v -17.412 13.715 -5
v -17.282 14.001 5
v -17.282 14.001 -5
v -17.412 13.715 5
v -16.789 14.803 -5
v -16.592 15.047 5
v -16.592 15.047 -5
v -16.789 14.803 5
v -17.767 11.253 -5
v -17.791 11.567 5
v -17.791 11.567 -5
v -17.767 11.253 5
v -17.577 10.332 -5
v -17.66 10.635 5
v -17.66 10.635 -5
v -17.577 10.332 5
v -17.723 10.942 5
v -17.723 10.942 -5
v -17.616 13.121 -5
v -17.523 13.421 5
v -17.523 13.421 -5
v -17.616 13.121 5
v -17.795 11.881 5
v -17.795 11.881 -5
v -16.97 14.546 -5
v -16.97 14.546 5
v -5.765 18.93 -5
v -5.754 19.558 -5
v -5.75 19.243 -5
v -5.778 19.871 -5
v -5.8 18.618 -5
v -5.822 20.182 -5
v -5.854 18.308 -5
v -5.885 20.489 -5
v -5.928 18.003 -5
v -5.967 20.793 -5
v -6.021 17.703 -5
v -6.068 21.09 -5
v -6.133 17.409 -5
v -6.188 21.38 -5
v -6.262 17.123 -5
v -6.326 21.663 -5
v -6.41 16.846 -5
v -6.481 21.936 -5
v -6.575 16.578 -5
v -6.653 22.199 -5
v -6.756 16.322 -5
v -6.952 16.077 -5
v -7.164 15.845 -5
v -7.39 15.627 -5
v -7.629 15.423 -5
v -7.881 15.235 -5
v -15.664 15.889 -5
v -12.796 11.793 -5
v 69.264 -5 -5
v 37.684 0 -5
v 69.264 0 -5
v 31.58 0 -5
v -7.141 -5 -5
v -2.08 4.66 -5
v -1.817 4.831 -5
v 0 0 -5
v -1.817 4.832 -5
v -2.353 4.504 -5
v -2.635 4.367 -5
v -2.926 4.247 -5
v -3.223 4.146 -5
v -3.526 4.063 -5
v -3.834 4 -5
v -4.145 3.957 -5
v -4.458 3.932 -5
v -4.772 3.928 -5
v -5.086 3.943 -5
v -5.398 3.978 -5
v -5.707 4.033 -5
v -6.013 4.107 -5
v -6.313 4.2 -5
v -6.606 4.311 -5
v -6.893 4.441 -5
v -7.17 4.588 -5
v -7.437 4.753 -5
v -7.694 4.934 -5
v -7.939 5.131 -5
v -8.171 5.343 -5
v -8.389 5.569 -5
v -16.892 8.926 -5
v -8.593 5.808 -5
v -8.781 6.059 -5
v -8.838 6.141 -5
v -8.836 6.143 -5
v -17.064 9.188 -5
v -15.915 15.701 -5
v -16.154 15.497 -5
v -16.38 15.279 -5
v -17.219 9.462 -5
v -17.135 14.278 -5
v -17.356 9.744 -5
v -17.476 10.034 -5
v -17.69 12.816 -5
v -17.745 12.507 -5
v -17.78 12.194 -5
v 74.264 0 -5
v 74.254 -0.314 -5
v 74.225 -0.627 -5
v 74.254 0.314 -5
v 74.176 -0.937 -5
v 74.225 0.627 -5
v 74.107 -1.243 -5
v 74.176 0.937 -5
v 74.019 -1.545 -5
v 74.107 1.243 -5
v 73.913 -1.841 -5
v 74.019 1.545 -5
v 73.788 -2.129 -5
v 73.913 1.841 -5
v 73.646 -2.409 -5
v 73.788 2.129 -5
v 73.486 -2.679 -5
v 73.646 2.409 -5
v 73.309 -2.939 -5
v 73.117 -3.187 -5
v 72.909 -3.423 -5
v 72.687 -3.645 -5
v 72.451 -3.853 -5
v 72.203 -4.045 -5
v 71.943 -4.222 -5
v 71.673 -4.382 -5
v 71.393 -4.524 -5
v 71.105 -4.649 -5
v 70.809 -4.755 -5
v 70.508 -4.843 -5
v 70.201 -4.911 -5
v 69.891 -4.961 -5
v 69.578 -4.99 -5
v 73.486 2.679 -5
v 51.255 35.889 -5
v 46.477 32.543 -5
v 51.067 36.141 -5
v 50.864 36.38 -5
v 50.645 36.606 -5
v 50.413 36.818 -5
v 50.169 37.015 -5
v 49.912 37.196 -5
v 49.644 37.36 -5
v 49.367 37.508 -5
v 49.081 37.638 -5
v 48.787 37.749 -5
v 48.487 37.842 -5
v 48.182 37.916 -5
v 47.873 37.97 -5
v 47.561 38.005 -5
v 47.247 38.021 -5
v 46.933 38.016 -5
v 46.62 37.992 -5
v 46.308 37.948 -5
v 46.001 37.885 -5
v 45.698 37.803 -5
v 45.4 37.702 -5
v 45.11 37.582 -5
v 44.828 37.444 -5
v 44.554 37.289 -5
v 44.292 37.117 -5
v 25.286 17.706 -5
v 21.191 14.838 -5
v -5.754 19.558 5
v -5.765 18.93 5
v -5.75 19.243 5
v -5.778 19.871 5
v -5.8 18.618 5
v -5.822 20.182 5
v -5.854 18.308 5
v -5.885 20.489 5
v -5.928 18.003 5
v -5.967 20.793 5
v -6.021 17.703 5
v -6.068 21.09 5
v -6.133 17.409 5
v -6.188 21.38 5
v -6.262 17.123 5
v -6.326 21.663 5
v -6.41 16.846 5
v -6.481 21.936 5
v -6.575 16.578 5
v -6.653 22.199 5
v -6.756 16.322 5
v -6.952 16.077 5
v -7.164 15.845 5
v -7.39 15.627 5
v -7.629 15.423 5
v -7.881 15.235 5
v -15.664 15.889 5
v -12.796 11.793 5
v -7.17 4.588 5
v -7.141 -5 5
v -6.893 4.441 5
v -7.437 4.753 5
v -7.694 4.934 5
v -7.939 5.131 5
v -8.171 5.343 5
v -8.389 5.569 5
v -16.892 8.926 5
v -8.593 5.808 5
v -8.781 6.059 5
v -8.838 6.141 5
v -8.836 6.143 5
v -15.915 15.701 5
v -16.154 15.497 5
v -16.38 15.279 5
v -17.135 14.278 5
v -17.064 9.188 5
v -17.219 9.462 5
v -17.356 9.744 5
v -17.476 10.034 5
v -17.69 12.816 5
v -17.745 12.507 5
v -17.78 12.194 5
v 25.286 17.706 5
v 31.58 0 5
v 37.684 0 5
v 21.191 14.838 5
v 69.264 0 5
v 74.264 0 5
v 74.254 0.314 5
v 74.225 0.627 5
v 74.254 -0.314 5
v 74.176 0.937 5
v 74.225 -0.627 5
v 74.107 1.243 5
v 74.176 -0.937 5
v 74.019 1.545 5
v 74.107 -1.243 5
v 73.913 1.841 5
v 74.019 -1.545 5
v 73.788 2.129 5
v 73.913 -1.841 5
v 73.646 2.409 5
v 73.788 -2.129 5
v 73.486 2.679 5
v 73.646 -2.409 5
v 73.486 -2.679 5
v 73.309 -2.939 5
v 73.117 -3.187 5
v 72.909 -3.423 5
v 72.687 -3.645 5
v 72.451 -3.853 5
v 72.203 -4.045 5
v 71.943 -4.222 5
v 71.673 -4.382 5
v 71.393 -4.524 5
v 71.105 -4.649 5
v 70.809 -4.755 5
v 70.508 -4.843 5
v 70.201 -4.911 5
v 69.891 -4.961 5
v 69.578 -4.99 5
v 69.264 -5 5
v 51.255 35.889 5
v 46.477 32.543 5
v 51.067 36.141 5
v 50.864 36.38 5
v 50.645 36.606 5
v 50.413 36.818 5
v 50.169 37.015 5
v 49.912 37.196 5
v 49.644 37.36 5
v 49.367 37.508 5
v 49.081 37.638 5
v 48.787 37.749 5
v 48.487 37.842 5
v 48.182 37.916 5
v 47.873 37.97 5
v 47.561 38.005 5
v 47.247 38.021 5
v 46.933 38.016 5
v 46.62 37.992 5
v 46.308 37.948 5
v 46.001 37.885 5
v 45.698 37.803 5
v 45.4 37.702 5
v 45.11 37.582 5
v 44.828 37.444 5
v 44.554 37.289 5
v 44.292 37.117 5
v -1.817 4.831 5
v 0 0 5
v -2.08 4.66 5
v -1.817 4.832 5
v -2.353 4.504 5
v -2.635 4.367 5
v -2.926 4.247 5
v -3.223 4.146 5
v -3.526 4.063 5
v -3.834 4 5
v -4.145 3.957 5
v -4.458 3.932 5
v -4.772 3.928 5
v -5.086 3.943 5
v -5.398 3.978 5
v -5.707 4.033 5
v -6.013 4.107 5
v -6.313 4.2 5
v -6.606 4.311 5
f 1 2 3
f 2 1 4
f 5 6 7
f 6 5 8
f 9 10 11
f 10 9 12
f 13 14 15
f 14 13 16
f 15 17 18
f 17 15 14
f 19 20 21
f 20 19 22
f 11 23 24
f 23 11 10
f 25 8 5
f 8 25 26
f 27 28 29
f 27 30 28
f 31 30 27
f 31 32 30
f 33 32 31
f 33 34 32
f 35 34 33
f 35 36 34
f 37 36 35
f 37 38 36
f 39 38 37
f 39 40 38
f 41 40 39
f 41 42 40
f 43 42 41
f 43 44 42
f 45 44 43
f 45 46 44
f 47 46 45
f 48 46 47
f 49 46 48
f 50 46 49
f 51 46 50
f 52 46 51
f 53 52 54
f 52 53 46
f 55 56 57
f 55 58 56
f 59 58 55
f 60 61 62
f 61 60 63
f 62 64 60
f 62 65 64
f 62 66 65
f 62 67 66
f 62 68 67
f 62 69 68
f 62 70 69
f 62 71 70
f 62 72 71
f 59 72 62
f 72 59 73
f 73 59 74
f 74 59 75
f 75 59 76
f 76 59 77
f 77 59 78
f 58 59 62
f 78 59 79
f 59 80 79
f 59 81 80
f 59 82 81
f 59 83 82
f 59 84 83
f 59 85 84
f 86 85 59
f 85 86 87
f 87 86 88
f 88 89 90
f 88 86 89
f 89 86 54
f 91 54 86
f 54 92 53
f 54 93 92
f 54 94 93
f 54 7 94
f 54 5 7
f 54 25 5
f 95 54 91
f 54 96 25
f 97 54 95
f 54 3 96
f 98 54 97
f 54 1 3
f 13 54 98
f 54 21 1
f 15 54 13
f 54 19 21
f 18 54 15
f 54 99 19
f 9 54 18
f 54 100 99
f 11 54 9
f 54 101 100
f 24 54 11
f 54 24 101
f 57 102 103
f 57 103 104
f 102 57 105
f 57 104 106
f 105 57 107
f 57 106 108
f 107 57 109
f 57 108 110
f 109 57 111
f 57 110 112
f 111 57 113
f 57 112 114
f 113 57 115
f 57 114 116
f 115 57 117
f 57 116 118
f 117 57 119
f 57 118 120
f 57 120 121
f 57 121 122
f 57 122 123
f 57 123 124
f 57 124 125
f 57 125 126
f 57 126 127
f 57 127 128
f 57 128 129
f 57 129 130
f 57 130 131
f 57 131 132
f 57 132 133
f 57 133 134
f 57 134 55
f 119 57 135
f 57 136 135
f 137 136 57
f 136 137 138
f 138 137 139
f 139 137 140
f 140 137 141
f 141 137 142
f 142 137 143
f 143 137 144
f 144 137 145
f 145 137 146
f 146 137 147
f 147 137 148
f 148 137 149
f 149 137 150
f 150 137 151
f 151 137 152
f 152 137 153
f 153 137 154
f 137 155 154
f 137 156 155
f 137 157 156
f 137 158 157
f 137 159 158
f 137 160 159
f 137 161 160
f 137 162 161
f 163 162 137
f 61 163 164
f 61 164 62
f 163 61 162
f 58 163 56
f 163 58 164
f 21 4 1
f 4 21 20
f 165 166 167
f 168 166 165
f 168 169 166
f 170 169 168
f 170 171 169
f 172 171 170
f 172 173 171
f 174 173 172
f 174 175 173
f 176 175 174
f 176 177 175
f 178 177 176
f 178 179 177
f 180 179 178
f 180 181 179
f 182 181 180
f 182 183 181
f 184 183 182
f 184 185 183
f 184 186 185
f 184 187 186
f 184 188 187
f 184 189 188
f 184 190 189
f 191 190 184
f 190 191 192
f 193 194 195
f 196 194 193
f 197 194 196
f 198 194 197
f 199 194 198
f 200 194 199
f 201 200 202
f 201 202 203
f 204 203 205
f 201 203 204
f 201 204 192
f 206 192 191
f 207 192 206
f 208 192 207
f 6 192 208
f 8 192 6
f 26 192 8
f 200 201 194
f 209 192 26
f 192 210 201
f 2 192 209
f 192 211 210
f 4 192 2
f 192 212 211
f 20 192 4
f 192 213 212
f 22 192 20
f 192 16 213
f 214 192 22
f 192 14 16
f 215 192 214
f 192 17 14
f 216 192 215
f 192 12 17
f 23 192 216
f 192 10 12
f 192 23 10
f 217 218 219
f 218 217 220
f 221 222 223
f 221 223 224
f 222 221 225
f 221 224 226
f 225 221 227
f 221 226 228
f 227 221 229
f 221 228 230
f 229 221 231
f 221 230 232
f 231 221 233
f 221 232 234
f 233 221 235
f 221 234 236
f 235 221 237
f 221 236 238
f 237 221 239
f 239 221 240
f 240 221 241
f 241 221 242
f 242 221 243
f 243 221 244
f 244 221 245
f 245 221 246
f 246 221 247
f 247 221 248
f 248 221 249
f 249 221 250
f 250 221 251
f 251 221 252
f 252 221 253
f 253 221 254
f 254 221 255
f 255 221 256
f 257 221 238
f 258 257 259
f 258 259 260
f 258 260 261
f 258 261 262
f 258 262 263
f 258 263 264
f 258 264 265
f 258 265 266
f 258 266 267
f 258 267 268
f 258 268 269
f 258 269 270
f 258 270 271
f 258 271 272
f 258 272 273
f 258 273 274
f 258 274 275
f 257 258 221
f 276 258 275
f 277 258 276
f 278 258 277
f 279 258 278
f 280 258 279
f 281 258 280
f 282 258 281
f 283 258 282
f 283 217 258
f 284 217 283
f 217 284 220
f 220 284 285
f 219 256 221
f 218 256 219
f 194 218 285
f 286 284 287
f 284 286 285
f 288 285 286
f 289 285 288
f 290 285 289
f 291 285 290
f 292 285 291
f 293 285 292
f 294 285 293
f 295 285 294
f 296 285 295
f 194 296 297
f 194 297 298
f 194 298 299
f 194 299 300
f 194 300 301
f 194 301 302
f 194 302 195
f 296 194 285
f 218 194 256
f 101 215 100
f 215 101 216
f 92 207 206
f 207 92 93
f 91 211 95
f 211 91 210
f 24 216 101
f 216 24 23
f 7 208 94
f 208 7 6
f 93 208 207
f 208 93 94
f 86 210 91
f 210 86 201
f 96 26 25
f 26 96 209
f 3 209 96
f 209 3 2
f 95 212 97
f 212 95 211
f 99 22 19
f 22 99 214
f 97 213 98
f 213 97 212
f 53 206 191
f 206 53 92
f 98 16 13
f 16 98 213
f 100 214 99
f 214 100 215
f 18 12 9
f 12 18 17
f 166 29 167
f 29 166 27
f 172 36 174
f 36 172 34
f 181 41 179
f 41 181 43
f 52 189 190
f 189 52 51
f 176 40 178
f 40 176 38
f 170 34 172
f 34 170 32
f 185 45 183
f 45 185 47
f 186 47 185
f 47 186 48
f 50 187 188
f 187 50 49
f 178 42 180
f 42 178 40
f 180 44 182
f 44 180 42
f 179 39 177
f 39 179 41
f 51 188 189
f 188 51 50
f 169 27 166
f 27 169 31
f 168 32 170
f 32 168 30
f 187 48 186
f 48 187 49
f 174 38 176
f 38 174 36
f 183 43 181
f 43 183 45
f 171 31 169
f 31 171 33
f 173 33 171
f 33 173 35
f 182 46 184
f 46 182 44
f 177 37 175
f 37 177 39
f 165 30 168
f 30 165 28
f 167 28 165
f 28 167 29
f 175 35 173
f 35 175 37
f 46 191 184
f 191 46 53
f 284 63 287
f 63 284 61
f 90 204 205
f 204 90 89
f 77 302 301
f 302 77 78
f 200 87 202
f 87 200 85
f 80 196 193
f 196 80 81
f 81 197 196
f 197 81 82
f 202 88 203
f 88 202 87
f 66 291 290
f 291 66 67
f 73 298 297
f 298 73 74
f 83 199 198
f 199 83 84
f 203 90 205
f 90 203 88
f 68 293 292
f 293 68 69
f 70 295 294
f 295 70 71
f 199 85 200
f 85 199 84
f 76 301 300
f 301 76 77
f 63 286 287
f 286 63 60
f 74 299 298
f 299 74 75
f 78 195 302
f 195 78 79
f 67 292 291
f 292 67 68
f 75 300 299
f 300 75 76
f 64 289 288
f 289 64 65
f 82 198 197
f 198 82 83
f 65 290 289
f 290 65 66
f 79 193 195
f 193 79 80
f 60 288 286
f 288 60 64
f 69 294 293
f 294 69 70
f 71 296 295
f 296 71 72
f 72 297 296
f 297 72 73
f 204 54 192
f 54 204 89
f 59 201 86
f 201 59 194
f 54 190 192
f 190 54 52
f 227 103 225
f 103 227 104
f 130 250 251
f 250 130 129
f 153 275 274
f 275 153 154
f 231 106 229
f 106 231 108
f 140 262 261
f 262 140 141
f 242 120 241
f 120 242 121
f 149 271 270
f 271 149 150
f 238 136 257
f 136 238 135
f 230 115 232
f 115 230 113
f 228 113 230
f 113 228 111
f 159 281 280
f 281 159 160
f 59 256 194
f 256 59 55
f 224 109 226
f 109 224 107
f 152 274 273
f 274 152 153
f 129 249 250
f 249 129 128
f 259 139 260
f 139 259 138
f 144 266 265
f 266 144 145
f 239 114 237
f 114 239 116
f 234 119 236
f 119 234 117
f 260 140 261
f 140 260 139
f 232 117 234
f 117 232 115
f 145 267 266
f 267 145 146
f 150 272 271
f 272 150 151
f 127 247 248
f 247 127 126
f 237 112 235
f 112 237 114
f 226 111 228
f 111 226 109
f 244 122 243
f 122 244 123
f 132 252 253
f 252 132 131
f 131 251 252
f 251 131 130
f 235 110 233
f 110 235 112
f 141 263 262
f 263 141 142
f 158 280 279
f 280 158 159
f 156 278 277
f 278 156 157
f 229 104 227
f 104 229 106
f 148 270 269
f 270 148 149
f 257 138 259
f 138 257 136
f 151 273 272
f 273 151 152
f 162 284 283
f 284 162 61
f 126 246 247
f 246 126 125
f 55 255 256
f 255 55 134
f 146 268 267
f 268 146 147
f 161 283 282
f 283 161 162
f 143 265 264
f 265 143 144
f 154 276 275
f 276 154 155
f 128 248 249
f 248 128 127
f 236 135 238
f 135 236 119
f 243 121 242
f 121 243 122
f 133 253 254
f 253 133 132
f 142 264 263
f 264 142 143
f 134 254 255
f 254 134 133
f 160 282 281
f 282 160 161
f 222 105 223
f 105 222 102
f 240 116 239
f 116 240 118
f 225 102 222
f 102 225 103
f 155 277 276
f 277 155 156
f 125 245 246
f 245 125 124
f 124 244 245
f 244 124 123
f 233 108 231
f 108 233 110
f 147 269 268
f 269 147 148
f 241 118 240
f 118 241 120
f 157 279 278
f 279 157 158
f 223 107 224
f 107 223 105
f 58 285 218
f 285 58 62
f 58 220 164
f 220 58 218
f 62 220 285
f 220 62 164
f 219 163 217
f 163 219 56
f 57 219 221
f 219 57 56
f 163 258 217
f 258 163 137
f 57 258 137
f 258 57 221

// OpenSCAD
$fn=100;

*translate(-[ 18.45, 25.08, 70 ])import("GeomStandBig.stl");



//configure     default Vals MacBook Retina 15"
//roundings = 5;  //  5 
//Wall thickness (mm)
wallThick = 5;  // [2:8]

//Angle (Deg)
angleDeg = 35;  // [15:50]

//Deepnes of the base(mm)
baseDeep = 220; // 

//Width of the Stand(mm)
standWidth = 10;// [2:20]

//Spacing of the Hook(mm)
hookSpace = 12; // [5:20]

// Length of the Hook(mm). Zero = No Hook
hookLen = 6;   // [30]

/* [Hidden] */
fudge = 0.1;    //0.1

subDivs = 6;

surfaceLen = cos(angleDeg) * baseDeep;
topXCord = pow(surfaceLen,2)/baseDeep;
topYCord = sqrt((baseDeep-topXCord)*topXCord);


fieldWdth = (surfaceLen-(subDivs-1)*wallThick)/subDivs;
echo(surfaceLen,fieldWdth);
echo(norm([ 144.02, 100.45, 5.00 ]));

// triangle calculations
// tan alpha = GK/AK
// cos alpha = AK/HYP
// sin alpha = GK/HYP
// b²=c*q
// a²+b²=c²
dFieldWdth = fieldWdth*2+wallThick; //double field width (adjactence side)
GK = tan(angleDeg)*fieldWdth; //opposite width of triangle to remove

dGK = tan(angleDeg)* dFieldWdth; //opposite width of the large triangle
dAK = dFieldWdth;
dHYP = dGK / sin(angleDeg); //hypotenuse width of large triangle

HYP1 = sqrt(pow(fieldWdth,2)+pow(GK,2)); //The hypotenuse of the triangle to remove
HYP2 = wallThick / cos(angleDeg);  //the hypotenuse of the small wall base, width to next triangle
GK2 = sqrt(pow(HYP2,2)-pow(wallThick,2)); //opposite width of the small tri at the base f the wall
GK3 = sin(angleDeg)*wallThick; //opposite width of small tri at the rightmost triangle
AK3 = cos(angleDeg)*wallThick;

GK4 = wallThick-AK3+fudge; //very small Tri at opener
HYP4 = GK4/sin(angleDeg);
AK4 = cos(angleDeg) * HYP4;

AK5 = GK4;
HYP5 = AK5/cos(angleDeg);

Hg = sin(angleDeg)*dFieldWdth;
q = Hg+wallThick/tan(angleDeg);
echo(GK3);
    

//base geometry
//big one
*difference(){
union(){
    hull(){
        cylinder(h=standWidth,r=wallThick, center=true);
        translate ([baseDeep,0,0]) 
            cylinder(h=standWidth,r=wallThick, center=true);
        translate ([topXCord,topYCord,0]) 
            cylinder(h=standWidth,r=wallThick, center=true);
    }

    //get translation for the hook in X dir
    AK=wallThick/tan(angleDeg);

    translate([-AK,-wallThick,-standWidth/2])
        rotate([0,0,angleDeg])       
            hook();
    translate([-AK,-wallThick,-standWidth/2]) 
        cube([AK,wallThick,standWidth]);
}


// now the recesses 
//polys
    //#1
    rotate([0,0,angleDeg]) linear_extrude(height=standWidth+fudge,center=true) polygon([[0,0],[fieldWdth,0],[fieldWdth,-GK]]);
    //#2 (tri+quad)
    translate ([HYP1+HYP2,0,0]) 
        rotate([0,0,angleDeg]) 
        linear_extrude(height=standWidth+fudge,center=true) 
            polygon([[0,0],[0,GK+GK2],[fieldWdth,GK+GK2],[fieldWdth,0],[fieldWdth,-GK]]);
    //#3 (double, opens at bottom)
    //#translate ([(HYP1+HYP2)*2+GK3,-AK3,0]) 
    translate ([(HYP1+HYP2)*2+GK3-AK4,-wallThick-fudge,0]) 
        rotate([0,0,angleDeg]) 
        linear_extrude(height=standWidth+fudge,center=true) 
            polygon([[0,0],[dFieldWdth+AK4,0],[dFieldWdth+AK4,-dGK-HYP5]]);

    //#4 (double)
    translate ([(HYP1+HYP2)*4,0,0]) rotate([0,0,angleDeg]) 
        linear_extrude(height=standWidth+fudge,center=true) 
            polygon([[0,0],[dFieldWdth,0],[dFieldWdth,-dGK]]);
            
//now the rectangles
    recDepth2=2*(GK+GK2);
    //#1
    translate([(HYP1+HYP2)*2,0,-(standWidth+fudge)/2])
        rotate([0,0,angleDeg]) cube([dFieldWdth,(recDepth2-wallThick)/2,standWidth+fudge]);
    //#2
    translate([(HYP1+HYP2)*2,0,-(standWidth+fudge)/2])
        rotate([0,0,angleDeg]) 
            translate([0,(recDepth2-wallThick)/2+wallThick,0])cube([dFieldWdth,(recDepth2-wallThick)/2,standWidth+fudge]);
    //#3
    translate([(HYP1+HYP2)*4,0,-(standWidth+fudge)/2])rotate([0,0,angleDeg]) 
        translate([0,dGK+GK2,0])cube([fieldWdth,recDepth2,standWidth+fudge]);
        
 
    //#4
    translate([(HYP1+HYP2)*5,0,-(standWidth+fudge)/2])rotate([0,0,angleDeg]) 
        translate([0,dGK+GK2+GK+GK2,0])cube([fieldWdth,recDepth2,standWidth+fudge,]);
        
    //#5
    translate([(HYP1+HYP2)*4-GK3,AK3,-(standWidth+fudge)/2]) rotate([0,0,angleDeg]) 
        translate([0,0,0])cube([fieldWdth*2+wallThick,2*GK-GK2,standWidth+fudge,]);
   
    
}
// the small one

    difference(){
        union(){
            hull(){
                cylinder(h=standWidth,r=wallThick, center=true);
                translate ([2*HYP1+HYP2,0,0]) 
                    cylinder(h=standWidth,r=wallThick, center=true);
                rotate([0,0,angleDeg])
                translate ([surfaceLen*(2/subDivs)-wallThick/2,0,0]) 
                    cylinder(h=standWidth,r=wallThick, center=true);
            }

            //get translation for the hook in X dir
            AK=wallThick/tan(angleDeg);

            translate([-AK,-wallThick,-standWidth/2])
                rotate([0,0,angleDeg])       
                    hook();
            translate([-AK,-wallThick,-standWidth/2]) 
                cube([AK,wallThick,standWidth]);
        }
        //#1
        rotate([0,0,angleDeg]) linear_extrude(height=standWidth+fudge,center=true) polygon([[0,0],[fieldWdth,0],[fieldWdth,-GK]]);
        
        //#2 (tri+quad)
        translate ([HYP1+HYP2,0,0]) 
            rotate([0,0,angleDeg]) 
            linear_extrude(height=standWidth+fudge,center=true) 
                polygon([[0,0],[0,GK+GK2],[fieldWdth,GK+GK2],[fieldWdth,0],[fieldWdth,-GK]]);
    }


module hook(){

    union(){
        cube([wallThick,hookSpace+wallThick,standWidth]);
        translate([wallThick,hookSpace+wallThick,0])
            intersection(){
                cylinder(h=standWidth,r=wallThick, center=false);
                translate([-wallThick-fudge,0,-fudge/2]) cube([wallThick+fudge,wallThick+fudge,standWidth+fudge]);
            }
        if (hookLen) translate([wallThick,hookSpace+wallThick,0]) cube([hookLen,wallThick,standWidth]);
        if (hookLen) translate([wallThick+hookLen,hookSpace+wallThick*2,0]) 
            intersection(){
            cylinder(h=standWidth,r=wallThick, center=false);
                translate([0,-wallThick-fudge,-fudge/2]) cube([wallThick+fudge,wallThick+fudge,standWidth+fudge]);
            }
        translate([wallThick*2,2*wallThick,0]) 
            difference(){
                translate([-wallThick-fudge,-2*wallThick,0]) cube([wallThick+fudge,2*wallThick+fudge,standWidth]);
                translate([0,0,-fudge/2]) cylinder(h=standWidth+fudge,r=wallThick, center=false);
            }
    }
}
